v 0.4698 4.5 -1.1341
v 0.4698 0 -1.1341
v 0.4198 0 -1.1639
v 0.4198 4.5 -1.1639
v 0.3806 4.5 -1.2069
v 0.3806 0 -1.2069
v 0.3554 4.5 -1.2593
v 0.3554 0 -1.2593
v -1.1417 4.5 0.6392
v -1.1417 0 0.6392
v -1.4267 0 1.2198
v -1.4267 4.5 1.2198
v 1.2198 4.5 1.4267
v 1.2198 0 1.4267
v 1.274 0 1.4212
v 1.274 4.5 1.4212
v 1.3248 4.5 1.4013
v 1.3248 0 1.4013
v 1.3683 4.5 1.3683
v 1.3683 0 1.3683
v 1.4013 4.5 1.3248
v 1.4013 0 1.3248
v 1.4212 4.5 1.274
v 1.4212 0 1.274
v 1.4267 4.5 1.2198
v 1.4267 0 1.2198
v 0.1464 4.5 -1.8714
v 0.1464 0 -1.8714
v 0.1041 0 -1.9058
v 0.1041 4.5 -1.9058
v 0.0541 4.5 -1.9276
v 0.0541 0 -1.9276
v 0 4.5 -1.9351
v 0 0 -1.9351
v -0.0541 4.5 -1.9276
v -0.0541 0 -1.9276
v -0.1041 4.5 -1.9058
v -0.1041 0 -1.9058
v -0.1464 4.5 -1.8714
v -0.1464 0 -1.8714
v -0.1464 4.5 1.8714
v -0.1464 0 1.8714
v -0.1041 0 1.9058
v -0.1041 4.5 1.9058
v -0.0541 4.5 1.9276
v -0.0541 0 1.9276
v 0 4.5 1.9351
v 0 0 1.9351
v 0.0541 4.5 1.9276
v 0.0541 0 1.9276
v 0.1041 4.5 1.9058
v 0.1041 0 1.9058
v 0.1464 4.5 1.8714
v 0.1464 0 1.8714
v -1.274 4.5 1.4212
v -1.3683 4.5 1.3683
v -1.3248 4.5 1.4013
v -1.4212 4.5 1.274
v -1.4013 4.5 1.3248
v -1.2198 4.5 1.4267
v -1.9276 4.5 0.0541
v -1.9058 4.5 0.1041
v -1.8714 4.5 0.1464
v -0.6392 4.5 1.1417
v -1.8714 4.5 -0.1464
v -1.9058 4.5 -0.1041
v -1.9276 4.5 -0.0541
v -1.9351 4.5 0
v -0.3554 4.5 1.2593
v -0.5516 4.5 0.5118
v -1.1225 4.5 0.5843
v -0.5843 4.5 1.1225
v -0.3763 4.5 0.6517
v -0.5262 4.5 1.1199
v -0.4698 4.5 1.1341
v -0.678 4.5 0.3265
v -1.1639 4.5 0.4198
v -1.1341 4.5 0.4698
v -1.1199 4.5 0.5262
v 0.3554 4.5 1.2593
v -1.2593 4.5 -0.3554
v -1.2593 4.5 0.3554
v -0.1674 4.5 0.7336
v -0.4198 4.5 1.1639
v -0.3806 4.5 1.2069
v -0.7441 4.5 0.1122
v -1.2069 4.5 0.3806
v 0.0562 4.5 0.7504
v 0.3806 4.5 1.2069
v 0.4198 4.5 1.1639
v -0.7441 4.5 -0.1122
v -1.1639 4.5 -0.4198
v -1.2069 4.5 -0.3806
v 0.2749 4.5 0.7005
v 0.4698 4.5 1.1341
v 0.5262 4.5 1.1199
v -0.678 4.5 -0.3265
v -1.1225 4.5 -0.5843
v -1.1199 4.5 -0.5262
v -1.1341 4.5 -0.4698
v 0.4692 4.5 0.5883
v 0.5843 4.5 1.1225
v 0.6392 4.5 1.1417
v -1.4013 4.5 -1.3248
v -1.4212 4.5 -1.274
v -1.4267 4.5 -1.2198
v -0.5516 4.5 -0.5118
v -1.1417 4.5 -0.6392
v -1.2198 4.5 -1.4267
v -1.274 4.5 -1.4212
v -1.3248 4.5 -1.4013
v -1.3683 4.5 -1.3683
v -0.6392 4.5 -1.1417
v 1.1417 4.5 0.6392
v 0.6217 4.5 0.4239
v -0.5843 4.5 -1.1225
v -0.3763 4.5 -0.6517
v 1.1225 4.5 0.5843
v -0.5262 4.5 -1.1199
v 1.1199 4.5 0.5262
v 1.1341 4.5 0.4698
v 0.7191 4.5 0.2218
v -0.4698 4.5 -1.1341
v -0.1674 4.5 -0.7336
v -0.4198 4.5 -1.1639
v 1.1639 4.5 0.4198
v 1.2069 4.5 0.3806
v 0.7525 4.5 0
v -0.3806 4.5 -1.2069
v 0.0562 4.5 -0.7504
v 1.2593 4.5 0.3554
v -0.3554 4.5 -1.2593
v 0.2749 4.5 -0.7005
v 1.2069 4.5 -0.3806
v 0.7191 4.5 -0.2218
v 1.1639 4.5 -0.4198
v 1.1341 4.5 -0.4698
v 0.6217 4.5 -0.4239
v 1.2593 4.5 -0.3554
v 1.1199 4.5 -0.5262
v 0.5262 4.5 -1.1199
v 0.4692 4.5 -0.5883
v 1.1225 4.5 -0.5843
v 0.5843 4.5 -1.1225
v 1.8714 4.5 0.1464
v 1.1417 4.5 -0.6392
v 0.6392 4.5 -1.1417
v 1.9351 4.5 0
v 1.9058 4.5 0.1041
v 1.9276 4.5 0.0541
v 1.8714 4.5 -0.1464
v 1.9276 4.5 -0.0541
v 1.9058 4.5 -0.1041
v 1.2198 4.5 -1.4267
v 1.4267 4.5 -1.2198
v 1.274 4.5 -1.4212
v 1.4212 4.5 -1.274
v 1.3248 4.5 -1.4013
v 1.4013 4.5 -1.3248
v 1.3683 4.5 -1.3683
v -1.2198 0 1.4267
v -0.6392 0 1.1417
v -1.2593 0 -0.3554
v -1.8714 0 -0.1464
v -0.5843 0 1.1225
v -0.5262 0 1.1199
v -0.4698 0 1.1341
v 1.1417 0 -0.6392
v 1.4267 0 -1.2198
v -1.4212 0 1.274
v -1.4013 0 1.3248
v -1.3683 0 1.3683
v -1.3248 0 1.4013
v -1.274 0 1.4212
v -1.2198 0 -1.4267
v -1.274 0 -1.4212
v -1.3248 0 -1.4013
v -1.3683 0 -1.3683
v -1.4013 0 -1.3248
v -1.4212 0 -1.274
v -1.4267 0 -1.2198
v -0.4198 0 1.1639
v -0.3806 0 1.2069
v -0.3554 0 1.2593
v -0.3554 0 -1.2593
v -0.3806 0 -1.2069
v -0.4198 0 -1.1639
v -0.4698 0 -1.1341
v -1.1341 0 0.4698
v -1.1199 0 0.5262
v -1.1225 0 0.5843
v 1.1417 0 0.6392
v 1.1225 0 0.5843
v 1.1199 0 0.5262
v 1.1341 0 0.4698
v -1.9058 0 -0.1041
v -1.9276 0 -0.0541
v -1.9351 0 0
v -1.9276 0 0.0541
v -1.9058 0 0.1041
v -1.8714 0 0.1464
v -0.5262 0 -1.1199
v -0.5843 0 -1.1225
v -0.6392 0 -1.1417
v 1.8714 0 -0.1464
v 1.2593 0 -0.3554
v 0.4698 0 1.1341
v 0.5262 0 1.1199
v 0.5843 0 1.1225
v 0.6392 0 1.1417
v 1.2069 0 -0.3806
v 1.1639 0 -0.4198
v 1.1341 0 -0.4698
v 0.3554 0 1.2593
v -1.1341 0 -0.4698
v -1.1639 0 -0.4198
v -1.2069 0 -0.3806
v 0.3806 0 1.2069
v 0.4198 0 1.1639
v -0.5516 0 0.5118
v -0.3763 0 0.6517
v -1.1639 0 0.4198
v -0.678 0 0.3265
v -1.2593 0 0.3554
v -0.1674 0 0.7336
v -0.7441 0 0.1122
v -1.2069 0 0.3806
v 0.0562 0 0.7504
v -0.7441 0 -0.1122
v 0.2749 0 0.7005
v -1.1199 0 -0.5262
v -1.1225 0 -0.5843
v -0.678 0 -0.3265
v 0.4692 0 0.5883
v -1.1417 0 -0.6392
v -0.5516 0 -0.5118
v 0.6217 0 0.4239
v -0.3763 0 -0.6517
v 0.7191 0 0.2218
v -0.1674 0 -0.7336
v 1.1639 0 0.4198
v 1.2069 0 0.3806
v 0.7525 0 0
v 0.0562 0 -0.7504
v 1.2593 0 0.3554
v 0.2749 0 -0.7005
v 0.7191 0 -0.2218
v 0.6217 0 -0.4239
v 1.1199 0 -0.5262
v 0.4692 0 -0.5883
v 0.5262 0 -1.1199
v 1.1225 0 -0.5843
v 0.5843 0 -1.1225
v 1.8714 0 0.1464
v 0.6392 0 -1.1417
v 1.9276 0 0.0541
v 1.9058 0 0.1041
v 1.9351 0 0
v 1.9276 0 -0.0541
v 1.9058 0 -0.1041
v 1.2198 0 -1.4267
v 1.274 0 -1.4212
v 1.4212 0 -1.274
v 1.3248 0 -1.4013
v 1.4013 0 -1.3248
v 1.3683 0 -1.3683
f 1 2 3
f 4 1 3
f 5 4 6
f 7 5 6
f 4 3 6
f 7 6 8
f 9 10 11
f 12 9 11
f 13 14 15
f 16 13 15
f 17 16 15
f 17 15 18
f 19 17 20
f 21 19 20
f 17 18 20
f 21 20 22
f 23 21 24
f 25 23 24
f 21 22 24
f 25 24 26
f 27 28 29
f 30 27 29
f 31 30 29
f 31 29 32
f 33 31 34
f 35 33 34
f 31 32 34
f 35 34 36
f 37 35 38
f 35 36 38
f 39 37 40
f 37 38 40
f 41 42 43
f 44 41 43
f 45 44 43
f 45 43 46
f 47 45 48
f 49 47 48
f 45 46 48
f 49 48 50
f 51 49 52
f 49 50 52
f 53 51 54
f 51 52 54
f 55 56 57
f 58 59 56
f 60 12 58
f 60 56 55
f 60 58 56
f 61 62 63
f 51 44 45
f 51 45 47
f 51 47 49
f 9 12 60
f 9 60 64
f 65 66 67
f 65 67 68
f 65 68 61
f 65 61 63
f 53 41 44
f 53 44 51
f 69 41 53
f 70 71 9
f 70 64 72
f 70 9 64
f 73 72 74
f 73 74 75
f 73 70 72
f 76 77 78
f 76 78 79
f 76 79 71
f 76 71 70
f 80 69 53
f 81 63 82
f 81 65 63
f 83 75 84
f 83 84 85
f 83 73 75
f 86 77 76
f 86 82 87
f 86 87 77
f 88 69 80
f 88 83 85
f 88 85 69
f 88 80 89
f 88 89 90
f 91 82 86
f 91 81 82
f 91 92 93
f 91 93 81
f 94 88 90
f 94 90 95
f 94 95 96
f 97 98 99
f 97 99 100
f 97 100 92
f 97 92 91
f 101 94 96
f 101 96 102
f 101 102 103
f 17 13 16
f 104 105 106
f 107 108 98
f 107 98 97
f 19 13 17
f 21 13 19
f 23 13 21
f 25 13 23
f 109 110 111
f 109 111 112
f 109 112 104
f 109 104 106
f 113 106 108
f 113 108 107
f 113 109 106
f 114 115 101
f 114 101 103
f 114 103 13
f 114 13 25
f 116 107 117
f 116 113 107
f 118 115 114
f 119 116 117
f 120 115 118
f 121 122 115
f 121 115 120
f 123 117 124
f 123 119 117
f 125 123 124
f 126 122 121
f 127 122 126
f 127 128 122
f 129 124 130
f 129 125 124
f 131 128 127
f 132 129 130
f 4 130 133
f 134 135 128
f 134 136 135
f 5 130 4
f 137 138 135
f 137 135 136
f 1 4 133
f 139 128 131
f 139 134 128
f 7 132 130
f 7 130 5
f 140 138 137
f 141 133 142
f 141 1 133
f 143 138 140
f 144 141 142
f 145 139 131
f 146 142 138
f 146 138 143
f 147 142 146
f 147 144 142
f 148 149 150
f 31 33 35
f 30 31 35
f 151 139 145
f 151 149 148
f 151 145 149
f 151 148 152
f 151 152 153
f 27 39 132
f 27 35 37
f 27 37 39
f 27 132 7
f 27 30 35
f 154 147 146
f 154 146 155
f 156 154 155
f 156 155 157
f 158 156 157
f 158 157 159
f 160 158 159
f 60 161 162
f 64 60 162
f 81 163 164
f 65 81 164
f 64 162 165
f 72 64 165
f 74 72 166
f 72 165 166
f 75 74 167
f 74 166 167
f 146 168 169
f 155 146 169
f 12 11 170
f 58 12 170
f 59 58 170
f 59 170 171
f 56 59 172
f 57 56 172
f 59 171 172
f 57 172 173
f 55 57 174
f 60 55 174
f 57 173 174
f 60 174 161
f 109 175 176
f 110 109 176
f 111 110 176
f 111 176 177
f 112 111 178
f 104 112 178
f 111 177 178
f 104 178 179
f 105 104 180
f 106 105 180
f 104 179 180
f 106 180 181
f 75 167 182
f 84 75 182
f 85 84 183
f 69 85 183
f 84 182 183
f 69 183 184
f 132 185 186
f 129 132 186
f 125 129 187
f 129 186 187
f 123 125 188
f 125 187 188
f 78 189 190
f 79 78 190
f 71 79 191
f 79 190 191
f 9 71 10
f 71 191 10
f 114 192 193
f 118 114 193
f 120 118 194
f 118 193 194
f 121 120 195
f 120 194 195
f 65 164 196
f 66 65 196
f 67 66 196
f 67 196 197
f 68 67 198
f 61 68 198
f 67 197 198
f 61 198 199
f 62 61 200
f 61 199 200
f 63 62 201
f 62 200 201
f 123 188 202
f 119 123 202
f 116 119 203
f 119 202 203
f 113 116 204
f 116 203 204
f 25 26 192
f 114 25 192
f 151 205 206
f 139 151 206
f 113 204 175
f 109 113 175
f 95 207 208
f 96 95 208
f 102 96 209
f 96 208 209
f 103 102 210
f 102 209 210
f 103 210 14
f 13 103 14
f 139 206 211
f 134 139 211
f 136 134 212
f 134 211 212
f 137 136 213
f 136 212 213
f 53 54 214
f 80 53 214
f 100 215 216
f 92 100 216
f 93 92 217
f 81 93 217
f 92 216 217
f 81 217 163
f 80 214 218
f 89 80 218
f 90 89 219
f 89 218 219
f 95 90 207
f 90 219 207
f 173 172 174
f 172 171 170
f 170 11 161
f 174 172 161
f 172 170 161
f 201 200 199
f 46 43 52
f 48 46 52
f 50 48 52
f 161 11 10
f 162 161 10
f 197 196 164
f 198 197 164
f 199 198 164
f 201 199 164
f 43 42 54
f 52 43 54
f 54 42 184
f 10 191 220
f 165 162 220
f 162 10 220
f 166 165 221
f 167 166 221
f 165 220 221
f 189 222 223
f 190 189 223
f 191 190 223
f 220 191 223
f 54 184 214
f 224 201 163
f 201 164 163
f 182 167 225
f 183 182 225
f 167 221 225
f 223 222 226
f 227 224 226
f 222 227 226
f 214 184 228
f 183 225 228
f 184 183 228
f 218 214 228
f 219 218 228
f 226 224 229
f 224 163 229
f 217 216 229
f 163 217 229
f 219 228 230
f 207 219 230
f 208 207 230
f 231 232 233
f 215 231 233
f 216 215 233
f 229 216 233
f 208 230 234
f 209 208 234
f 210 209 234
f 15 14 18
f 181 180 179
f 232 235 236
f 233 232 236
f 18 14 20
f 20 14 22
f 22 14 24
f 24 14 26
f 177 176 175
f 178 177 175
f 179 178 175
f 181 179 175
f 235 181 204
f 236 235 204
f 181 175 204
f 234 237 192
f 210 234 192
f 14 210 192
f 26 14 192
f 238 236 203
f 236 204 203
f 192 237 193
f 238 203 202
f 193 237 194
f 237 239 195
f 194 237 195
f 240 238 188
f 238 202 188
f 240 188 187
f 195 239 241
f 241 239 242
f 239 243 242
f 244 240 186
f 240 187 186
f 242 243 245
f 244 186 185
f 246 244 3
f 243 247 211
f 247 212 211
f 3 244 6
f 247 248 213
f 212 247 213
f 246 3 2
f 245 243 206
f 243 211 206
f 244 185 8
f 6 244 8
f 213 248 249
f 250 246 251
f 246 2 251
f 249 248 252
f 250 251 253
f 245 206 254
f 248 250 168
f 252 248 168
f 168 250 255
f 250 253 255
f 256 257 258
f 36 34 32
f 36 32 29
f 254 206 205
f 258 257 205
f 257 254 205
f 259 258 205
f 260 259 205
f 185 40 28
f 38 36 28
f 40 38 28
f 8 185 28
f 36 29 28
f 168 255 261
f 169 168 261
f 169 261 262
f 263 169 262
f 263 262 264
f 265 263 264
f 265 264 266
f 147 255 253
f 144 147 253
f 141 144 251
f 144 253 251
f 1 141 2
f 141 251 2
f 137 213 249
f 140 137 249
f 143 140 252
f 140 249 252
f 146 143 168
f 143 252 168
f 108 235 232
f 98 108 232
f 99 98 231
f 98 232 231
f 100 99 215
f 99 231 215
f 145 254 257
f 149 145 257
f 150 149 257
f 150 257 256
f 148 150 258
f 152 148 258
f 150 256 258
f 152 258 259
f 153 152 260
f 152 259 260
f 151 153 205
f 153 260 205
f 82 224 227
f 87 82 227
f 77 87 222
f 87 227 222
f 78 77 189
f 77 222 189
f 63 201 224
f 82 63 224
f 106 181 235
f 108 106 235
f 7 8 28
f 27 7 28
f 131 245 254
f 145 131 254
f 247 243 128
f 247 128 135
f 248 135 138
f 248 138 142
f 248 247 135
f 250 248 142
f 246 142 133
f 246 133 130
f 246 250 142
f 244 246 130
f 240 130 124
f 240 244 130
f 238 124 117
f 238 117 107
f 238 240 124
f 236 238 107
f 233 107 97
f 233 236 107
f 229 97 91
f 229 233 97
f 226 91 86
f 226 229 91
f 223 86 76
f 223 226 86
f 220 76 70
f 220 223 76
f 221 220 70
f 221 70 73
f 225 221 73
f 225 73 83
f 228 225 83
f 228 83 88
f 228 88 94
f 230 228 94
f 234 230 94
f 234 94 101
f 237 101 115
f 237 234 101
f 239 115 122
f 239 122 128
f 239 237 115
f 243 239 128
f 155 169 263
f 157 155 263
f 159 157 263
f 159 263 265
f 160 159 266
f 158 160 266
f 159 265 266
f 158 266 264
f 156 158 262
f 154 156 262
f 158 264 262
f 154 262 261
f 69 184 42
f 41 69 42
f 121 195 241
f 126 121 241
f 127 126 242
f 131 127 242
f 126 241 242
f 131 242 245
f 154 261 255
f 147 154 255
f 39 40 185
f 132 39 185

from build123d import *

# Parameters (mm, degrees)
SKETCH1_R           = 0.7525
BOSS_EXTRUDE1_DEPTH = 4.5


with BuildPart() as part:
    # Sketch1 → Boss-Extrude1 (new body)
    with BuildSketch(Plane(origin=(0, 0, 0), x_dir=(1, 0, 0), z_dir=(0, 1, 0))):
        with BuildLine():
            Line((-0.146366384, 1.87135971), (-0.355366692, 1.259293266))
            ThreePointArc((-0.355366692, 1.259293266), (-0.398631621, 1.183964502), (-0.469753326, 1.13408485))
            ThreePointArc((-0.469753326, 1.13408485), (-0.555314206, 1.11906445), (-0.63917261, 1.141737006))
            Line((-0.63917261, 1.141737006), (-1.219754478, 1.426747804))
            ThreePointArc((-1.219754478, 1.426747804), (-1.36829594, 1.36829594), (-1.426747804, 1.219754478))
            Line((-1.426747804, 1.219754478), (-1.141737006, 0.63917261))
            ThreePointArc((-1.141737006, 0.63917261), (-1.11906445, 0.555314206), (-1.13408485, 0.469753326))
            ThreePointArc((-1.13408485, 0.469753326), (-1.183964502, 0.398631621), (-1.259293266, 0.355366692))
            Line((-1.259293266, 0.355366692), (-1.87135971, 0.146366384))
            ThreePointArc((-1.87135971, 0.146366384), (-1.935062676, 0), (-1.87135971, -0.146366384))
            Line((-1.87135971, -0.146366384), (-1.259293266, -0.355366692))
            ThreePointArc((-1.259293266, -0.355366692), (-1.183964502, -0.398631621), (-1.13408485, -0.469753326))
            ThreePointArc((-1.13408485, -0.469753326), (-1.11906445, -0.555314206), (-1.141737006, -0.63917261))
            Line((-1.141737006, -0.63917261), (-1.426747804, -1.219754478))
            ThreePointArc((-1.426747804, -1.219754478), (-1.36829594, -1.36829594), (-1.219754478, -1.426747804))
            Line((-1.219754478, -1.426747804), (-0.63917261, -1.141737006))
            ThreePointArc((-0.63917261, -1.141737006), (-0.555314206, -1.11906445), (-0.469753326, -1.13408485))
            ThreePointArc((-0.469753326, -1.13408485), (-0.398631621, -1.183964502), (-0.355366692, -1.259293266))
            Line((-0.355366692, -1.259293266), (-0.146366384, -1.87135971))
            ThreePointArc((-0.146366384, -1.87135971), (0, -1.935062676), (0.146366384, -1.87135971))
            Line((0.146366384, -1.87135971), (0.355366692, -1.259293266))
            ThreePointArc((0.355366692, -1.259293266), (0.398631621, -1.183964502), (0.469753326, -1.13408485))
            ThreePointArc((0.469753326, -1.13408485), (0.555314206, -1.11906445), (0.63917261, -1.141737006))
            Line((0.63917261, -1.141737006), (1.219754478, -1.426747804))
            ThreePointArc((1.219754478, -1.426747804), (1.36829594, -1.36829594), (1.426747804, -1.219754478))
            Line((1.426747804, -1.219754478), (1.141737006, -0.63917261))
            ThreePointArc((1.141737006, -0.63917261), (1.11906445, -0.555314206), (1.13408485, -0.469753326))
            ThreePointArc((1.13408485, -0.469753326), (1.183964502, -0.398631621), (1.259293266, -0.355366692))
            Line((1.259293266, -0.355366692), (1.87135971, -0.146366384))
            ThreePointArc((1.87135971, -0.146366384), (1.935062676, 0), (1.87135971, 0.146366384))
            Line((1.87135971, 0.146366384), (1.259293266, 0.355366692))
            ThreePointArc((1.259293266, 0.355366692), (1.183964502, 0.398631621), (1.13408485, 0.469753326))
            ThreePointArc((1.13408485, 0.469753326), (1.11906445, 0.555314206), (1.141737006, 0.63917261))
            Line((1.141737006, 0.63917261), (1.426747804, 1.219754478))
            ThreePointArc((1.426747804, 1.219754478), (1.36829594, 1.36829594), (1.219754478, 1.426747804))
            Line((1.219754478, 1.426747804), (0.63917261, 1.141737006))
            ThreePointArc((0.63917261, 1.141737006), (0.555314206, 1.11906445), (0.469753326, 1.13408485))
            ThreePointArc((0.469753326, 1.13408485), (0.398631621, 1.183964502), (0.355366692, 1.259293266))
            Line((0.355366692, 1.259293266), (0.146366384, 1.87135971))
            ThreePointArc((0.146366384, 1.87135971), (0, 1.935062676), (-0.146366384, 1.87135971))
        make_face()
        Circle(SKETCH1_R, mode=Mode.SUBTRACT)
    extrude(amount=BOSS_EXTRUDE1_DEPTH)


solid = part.part
